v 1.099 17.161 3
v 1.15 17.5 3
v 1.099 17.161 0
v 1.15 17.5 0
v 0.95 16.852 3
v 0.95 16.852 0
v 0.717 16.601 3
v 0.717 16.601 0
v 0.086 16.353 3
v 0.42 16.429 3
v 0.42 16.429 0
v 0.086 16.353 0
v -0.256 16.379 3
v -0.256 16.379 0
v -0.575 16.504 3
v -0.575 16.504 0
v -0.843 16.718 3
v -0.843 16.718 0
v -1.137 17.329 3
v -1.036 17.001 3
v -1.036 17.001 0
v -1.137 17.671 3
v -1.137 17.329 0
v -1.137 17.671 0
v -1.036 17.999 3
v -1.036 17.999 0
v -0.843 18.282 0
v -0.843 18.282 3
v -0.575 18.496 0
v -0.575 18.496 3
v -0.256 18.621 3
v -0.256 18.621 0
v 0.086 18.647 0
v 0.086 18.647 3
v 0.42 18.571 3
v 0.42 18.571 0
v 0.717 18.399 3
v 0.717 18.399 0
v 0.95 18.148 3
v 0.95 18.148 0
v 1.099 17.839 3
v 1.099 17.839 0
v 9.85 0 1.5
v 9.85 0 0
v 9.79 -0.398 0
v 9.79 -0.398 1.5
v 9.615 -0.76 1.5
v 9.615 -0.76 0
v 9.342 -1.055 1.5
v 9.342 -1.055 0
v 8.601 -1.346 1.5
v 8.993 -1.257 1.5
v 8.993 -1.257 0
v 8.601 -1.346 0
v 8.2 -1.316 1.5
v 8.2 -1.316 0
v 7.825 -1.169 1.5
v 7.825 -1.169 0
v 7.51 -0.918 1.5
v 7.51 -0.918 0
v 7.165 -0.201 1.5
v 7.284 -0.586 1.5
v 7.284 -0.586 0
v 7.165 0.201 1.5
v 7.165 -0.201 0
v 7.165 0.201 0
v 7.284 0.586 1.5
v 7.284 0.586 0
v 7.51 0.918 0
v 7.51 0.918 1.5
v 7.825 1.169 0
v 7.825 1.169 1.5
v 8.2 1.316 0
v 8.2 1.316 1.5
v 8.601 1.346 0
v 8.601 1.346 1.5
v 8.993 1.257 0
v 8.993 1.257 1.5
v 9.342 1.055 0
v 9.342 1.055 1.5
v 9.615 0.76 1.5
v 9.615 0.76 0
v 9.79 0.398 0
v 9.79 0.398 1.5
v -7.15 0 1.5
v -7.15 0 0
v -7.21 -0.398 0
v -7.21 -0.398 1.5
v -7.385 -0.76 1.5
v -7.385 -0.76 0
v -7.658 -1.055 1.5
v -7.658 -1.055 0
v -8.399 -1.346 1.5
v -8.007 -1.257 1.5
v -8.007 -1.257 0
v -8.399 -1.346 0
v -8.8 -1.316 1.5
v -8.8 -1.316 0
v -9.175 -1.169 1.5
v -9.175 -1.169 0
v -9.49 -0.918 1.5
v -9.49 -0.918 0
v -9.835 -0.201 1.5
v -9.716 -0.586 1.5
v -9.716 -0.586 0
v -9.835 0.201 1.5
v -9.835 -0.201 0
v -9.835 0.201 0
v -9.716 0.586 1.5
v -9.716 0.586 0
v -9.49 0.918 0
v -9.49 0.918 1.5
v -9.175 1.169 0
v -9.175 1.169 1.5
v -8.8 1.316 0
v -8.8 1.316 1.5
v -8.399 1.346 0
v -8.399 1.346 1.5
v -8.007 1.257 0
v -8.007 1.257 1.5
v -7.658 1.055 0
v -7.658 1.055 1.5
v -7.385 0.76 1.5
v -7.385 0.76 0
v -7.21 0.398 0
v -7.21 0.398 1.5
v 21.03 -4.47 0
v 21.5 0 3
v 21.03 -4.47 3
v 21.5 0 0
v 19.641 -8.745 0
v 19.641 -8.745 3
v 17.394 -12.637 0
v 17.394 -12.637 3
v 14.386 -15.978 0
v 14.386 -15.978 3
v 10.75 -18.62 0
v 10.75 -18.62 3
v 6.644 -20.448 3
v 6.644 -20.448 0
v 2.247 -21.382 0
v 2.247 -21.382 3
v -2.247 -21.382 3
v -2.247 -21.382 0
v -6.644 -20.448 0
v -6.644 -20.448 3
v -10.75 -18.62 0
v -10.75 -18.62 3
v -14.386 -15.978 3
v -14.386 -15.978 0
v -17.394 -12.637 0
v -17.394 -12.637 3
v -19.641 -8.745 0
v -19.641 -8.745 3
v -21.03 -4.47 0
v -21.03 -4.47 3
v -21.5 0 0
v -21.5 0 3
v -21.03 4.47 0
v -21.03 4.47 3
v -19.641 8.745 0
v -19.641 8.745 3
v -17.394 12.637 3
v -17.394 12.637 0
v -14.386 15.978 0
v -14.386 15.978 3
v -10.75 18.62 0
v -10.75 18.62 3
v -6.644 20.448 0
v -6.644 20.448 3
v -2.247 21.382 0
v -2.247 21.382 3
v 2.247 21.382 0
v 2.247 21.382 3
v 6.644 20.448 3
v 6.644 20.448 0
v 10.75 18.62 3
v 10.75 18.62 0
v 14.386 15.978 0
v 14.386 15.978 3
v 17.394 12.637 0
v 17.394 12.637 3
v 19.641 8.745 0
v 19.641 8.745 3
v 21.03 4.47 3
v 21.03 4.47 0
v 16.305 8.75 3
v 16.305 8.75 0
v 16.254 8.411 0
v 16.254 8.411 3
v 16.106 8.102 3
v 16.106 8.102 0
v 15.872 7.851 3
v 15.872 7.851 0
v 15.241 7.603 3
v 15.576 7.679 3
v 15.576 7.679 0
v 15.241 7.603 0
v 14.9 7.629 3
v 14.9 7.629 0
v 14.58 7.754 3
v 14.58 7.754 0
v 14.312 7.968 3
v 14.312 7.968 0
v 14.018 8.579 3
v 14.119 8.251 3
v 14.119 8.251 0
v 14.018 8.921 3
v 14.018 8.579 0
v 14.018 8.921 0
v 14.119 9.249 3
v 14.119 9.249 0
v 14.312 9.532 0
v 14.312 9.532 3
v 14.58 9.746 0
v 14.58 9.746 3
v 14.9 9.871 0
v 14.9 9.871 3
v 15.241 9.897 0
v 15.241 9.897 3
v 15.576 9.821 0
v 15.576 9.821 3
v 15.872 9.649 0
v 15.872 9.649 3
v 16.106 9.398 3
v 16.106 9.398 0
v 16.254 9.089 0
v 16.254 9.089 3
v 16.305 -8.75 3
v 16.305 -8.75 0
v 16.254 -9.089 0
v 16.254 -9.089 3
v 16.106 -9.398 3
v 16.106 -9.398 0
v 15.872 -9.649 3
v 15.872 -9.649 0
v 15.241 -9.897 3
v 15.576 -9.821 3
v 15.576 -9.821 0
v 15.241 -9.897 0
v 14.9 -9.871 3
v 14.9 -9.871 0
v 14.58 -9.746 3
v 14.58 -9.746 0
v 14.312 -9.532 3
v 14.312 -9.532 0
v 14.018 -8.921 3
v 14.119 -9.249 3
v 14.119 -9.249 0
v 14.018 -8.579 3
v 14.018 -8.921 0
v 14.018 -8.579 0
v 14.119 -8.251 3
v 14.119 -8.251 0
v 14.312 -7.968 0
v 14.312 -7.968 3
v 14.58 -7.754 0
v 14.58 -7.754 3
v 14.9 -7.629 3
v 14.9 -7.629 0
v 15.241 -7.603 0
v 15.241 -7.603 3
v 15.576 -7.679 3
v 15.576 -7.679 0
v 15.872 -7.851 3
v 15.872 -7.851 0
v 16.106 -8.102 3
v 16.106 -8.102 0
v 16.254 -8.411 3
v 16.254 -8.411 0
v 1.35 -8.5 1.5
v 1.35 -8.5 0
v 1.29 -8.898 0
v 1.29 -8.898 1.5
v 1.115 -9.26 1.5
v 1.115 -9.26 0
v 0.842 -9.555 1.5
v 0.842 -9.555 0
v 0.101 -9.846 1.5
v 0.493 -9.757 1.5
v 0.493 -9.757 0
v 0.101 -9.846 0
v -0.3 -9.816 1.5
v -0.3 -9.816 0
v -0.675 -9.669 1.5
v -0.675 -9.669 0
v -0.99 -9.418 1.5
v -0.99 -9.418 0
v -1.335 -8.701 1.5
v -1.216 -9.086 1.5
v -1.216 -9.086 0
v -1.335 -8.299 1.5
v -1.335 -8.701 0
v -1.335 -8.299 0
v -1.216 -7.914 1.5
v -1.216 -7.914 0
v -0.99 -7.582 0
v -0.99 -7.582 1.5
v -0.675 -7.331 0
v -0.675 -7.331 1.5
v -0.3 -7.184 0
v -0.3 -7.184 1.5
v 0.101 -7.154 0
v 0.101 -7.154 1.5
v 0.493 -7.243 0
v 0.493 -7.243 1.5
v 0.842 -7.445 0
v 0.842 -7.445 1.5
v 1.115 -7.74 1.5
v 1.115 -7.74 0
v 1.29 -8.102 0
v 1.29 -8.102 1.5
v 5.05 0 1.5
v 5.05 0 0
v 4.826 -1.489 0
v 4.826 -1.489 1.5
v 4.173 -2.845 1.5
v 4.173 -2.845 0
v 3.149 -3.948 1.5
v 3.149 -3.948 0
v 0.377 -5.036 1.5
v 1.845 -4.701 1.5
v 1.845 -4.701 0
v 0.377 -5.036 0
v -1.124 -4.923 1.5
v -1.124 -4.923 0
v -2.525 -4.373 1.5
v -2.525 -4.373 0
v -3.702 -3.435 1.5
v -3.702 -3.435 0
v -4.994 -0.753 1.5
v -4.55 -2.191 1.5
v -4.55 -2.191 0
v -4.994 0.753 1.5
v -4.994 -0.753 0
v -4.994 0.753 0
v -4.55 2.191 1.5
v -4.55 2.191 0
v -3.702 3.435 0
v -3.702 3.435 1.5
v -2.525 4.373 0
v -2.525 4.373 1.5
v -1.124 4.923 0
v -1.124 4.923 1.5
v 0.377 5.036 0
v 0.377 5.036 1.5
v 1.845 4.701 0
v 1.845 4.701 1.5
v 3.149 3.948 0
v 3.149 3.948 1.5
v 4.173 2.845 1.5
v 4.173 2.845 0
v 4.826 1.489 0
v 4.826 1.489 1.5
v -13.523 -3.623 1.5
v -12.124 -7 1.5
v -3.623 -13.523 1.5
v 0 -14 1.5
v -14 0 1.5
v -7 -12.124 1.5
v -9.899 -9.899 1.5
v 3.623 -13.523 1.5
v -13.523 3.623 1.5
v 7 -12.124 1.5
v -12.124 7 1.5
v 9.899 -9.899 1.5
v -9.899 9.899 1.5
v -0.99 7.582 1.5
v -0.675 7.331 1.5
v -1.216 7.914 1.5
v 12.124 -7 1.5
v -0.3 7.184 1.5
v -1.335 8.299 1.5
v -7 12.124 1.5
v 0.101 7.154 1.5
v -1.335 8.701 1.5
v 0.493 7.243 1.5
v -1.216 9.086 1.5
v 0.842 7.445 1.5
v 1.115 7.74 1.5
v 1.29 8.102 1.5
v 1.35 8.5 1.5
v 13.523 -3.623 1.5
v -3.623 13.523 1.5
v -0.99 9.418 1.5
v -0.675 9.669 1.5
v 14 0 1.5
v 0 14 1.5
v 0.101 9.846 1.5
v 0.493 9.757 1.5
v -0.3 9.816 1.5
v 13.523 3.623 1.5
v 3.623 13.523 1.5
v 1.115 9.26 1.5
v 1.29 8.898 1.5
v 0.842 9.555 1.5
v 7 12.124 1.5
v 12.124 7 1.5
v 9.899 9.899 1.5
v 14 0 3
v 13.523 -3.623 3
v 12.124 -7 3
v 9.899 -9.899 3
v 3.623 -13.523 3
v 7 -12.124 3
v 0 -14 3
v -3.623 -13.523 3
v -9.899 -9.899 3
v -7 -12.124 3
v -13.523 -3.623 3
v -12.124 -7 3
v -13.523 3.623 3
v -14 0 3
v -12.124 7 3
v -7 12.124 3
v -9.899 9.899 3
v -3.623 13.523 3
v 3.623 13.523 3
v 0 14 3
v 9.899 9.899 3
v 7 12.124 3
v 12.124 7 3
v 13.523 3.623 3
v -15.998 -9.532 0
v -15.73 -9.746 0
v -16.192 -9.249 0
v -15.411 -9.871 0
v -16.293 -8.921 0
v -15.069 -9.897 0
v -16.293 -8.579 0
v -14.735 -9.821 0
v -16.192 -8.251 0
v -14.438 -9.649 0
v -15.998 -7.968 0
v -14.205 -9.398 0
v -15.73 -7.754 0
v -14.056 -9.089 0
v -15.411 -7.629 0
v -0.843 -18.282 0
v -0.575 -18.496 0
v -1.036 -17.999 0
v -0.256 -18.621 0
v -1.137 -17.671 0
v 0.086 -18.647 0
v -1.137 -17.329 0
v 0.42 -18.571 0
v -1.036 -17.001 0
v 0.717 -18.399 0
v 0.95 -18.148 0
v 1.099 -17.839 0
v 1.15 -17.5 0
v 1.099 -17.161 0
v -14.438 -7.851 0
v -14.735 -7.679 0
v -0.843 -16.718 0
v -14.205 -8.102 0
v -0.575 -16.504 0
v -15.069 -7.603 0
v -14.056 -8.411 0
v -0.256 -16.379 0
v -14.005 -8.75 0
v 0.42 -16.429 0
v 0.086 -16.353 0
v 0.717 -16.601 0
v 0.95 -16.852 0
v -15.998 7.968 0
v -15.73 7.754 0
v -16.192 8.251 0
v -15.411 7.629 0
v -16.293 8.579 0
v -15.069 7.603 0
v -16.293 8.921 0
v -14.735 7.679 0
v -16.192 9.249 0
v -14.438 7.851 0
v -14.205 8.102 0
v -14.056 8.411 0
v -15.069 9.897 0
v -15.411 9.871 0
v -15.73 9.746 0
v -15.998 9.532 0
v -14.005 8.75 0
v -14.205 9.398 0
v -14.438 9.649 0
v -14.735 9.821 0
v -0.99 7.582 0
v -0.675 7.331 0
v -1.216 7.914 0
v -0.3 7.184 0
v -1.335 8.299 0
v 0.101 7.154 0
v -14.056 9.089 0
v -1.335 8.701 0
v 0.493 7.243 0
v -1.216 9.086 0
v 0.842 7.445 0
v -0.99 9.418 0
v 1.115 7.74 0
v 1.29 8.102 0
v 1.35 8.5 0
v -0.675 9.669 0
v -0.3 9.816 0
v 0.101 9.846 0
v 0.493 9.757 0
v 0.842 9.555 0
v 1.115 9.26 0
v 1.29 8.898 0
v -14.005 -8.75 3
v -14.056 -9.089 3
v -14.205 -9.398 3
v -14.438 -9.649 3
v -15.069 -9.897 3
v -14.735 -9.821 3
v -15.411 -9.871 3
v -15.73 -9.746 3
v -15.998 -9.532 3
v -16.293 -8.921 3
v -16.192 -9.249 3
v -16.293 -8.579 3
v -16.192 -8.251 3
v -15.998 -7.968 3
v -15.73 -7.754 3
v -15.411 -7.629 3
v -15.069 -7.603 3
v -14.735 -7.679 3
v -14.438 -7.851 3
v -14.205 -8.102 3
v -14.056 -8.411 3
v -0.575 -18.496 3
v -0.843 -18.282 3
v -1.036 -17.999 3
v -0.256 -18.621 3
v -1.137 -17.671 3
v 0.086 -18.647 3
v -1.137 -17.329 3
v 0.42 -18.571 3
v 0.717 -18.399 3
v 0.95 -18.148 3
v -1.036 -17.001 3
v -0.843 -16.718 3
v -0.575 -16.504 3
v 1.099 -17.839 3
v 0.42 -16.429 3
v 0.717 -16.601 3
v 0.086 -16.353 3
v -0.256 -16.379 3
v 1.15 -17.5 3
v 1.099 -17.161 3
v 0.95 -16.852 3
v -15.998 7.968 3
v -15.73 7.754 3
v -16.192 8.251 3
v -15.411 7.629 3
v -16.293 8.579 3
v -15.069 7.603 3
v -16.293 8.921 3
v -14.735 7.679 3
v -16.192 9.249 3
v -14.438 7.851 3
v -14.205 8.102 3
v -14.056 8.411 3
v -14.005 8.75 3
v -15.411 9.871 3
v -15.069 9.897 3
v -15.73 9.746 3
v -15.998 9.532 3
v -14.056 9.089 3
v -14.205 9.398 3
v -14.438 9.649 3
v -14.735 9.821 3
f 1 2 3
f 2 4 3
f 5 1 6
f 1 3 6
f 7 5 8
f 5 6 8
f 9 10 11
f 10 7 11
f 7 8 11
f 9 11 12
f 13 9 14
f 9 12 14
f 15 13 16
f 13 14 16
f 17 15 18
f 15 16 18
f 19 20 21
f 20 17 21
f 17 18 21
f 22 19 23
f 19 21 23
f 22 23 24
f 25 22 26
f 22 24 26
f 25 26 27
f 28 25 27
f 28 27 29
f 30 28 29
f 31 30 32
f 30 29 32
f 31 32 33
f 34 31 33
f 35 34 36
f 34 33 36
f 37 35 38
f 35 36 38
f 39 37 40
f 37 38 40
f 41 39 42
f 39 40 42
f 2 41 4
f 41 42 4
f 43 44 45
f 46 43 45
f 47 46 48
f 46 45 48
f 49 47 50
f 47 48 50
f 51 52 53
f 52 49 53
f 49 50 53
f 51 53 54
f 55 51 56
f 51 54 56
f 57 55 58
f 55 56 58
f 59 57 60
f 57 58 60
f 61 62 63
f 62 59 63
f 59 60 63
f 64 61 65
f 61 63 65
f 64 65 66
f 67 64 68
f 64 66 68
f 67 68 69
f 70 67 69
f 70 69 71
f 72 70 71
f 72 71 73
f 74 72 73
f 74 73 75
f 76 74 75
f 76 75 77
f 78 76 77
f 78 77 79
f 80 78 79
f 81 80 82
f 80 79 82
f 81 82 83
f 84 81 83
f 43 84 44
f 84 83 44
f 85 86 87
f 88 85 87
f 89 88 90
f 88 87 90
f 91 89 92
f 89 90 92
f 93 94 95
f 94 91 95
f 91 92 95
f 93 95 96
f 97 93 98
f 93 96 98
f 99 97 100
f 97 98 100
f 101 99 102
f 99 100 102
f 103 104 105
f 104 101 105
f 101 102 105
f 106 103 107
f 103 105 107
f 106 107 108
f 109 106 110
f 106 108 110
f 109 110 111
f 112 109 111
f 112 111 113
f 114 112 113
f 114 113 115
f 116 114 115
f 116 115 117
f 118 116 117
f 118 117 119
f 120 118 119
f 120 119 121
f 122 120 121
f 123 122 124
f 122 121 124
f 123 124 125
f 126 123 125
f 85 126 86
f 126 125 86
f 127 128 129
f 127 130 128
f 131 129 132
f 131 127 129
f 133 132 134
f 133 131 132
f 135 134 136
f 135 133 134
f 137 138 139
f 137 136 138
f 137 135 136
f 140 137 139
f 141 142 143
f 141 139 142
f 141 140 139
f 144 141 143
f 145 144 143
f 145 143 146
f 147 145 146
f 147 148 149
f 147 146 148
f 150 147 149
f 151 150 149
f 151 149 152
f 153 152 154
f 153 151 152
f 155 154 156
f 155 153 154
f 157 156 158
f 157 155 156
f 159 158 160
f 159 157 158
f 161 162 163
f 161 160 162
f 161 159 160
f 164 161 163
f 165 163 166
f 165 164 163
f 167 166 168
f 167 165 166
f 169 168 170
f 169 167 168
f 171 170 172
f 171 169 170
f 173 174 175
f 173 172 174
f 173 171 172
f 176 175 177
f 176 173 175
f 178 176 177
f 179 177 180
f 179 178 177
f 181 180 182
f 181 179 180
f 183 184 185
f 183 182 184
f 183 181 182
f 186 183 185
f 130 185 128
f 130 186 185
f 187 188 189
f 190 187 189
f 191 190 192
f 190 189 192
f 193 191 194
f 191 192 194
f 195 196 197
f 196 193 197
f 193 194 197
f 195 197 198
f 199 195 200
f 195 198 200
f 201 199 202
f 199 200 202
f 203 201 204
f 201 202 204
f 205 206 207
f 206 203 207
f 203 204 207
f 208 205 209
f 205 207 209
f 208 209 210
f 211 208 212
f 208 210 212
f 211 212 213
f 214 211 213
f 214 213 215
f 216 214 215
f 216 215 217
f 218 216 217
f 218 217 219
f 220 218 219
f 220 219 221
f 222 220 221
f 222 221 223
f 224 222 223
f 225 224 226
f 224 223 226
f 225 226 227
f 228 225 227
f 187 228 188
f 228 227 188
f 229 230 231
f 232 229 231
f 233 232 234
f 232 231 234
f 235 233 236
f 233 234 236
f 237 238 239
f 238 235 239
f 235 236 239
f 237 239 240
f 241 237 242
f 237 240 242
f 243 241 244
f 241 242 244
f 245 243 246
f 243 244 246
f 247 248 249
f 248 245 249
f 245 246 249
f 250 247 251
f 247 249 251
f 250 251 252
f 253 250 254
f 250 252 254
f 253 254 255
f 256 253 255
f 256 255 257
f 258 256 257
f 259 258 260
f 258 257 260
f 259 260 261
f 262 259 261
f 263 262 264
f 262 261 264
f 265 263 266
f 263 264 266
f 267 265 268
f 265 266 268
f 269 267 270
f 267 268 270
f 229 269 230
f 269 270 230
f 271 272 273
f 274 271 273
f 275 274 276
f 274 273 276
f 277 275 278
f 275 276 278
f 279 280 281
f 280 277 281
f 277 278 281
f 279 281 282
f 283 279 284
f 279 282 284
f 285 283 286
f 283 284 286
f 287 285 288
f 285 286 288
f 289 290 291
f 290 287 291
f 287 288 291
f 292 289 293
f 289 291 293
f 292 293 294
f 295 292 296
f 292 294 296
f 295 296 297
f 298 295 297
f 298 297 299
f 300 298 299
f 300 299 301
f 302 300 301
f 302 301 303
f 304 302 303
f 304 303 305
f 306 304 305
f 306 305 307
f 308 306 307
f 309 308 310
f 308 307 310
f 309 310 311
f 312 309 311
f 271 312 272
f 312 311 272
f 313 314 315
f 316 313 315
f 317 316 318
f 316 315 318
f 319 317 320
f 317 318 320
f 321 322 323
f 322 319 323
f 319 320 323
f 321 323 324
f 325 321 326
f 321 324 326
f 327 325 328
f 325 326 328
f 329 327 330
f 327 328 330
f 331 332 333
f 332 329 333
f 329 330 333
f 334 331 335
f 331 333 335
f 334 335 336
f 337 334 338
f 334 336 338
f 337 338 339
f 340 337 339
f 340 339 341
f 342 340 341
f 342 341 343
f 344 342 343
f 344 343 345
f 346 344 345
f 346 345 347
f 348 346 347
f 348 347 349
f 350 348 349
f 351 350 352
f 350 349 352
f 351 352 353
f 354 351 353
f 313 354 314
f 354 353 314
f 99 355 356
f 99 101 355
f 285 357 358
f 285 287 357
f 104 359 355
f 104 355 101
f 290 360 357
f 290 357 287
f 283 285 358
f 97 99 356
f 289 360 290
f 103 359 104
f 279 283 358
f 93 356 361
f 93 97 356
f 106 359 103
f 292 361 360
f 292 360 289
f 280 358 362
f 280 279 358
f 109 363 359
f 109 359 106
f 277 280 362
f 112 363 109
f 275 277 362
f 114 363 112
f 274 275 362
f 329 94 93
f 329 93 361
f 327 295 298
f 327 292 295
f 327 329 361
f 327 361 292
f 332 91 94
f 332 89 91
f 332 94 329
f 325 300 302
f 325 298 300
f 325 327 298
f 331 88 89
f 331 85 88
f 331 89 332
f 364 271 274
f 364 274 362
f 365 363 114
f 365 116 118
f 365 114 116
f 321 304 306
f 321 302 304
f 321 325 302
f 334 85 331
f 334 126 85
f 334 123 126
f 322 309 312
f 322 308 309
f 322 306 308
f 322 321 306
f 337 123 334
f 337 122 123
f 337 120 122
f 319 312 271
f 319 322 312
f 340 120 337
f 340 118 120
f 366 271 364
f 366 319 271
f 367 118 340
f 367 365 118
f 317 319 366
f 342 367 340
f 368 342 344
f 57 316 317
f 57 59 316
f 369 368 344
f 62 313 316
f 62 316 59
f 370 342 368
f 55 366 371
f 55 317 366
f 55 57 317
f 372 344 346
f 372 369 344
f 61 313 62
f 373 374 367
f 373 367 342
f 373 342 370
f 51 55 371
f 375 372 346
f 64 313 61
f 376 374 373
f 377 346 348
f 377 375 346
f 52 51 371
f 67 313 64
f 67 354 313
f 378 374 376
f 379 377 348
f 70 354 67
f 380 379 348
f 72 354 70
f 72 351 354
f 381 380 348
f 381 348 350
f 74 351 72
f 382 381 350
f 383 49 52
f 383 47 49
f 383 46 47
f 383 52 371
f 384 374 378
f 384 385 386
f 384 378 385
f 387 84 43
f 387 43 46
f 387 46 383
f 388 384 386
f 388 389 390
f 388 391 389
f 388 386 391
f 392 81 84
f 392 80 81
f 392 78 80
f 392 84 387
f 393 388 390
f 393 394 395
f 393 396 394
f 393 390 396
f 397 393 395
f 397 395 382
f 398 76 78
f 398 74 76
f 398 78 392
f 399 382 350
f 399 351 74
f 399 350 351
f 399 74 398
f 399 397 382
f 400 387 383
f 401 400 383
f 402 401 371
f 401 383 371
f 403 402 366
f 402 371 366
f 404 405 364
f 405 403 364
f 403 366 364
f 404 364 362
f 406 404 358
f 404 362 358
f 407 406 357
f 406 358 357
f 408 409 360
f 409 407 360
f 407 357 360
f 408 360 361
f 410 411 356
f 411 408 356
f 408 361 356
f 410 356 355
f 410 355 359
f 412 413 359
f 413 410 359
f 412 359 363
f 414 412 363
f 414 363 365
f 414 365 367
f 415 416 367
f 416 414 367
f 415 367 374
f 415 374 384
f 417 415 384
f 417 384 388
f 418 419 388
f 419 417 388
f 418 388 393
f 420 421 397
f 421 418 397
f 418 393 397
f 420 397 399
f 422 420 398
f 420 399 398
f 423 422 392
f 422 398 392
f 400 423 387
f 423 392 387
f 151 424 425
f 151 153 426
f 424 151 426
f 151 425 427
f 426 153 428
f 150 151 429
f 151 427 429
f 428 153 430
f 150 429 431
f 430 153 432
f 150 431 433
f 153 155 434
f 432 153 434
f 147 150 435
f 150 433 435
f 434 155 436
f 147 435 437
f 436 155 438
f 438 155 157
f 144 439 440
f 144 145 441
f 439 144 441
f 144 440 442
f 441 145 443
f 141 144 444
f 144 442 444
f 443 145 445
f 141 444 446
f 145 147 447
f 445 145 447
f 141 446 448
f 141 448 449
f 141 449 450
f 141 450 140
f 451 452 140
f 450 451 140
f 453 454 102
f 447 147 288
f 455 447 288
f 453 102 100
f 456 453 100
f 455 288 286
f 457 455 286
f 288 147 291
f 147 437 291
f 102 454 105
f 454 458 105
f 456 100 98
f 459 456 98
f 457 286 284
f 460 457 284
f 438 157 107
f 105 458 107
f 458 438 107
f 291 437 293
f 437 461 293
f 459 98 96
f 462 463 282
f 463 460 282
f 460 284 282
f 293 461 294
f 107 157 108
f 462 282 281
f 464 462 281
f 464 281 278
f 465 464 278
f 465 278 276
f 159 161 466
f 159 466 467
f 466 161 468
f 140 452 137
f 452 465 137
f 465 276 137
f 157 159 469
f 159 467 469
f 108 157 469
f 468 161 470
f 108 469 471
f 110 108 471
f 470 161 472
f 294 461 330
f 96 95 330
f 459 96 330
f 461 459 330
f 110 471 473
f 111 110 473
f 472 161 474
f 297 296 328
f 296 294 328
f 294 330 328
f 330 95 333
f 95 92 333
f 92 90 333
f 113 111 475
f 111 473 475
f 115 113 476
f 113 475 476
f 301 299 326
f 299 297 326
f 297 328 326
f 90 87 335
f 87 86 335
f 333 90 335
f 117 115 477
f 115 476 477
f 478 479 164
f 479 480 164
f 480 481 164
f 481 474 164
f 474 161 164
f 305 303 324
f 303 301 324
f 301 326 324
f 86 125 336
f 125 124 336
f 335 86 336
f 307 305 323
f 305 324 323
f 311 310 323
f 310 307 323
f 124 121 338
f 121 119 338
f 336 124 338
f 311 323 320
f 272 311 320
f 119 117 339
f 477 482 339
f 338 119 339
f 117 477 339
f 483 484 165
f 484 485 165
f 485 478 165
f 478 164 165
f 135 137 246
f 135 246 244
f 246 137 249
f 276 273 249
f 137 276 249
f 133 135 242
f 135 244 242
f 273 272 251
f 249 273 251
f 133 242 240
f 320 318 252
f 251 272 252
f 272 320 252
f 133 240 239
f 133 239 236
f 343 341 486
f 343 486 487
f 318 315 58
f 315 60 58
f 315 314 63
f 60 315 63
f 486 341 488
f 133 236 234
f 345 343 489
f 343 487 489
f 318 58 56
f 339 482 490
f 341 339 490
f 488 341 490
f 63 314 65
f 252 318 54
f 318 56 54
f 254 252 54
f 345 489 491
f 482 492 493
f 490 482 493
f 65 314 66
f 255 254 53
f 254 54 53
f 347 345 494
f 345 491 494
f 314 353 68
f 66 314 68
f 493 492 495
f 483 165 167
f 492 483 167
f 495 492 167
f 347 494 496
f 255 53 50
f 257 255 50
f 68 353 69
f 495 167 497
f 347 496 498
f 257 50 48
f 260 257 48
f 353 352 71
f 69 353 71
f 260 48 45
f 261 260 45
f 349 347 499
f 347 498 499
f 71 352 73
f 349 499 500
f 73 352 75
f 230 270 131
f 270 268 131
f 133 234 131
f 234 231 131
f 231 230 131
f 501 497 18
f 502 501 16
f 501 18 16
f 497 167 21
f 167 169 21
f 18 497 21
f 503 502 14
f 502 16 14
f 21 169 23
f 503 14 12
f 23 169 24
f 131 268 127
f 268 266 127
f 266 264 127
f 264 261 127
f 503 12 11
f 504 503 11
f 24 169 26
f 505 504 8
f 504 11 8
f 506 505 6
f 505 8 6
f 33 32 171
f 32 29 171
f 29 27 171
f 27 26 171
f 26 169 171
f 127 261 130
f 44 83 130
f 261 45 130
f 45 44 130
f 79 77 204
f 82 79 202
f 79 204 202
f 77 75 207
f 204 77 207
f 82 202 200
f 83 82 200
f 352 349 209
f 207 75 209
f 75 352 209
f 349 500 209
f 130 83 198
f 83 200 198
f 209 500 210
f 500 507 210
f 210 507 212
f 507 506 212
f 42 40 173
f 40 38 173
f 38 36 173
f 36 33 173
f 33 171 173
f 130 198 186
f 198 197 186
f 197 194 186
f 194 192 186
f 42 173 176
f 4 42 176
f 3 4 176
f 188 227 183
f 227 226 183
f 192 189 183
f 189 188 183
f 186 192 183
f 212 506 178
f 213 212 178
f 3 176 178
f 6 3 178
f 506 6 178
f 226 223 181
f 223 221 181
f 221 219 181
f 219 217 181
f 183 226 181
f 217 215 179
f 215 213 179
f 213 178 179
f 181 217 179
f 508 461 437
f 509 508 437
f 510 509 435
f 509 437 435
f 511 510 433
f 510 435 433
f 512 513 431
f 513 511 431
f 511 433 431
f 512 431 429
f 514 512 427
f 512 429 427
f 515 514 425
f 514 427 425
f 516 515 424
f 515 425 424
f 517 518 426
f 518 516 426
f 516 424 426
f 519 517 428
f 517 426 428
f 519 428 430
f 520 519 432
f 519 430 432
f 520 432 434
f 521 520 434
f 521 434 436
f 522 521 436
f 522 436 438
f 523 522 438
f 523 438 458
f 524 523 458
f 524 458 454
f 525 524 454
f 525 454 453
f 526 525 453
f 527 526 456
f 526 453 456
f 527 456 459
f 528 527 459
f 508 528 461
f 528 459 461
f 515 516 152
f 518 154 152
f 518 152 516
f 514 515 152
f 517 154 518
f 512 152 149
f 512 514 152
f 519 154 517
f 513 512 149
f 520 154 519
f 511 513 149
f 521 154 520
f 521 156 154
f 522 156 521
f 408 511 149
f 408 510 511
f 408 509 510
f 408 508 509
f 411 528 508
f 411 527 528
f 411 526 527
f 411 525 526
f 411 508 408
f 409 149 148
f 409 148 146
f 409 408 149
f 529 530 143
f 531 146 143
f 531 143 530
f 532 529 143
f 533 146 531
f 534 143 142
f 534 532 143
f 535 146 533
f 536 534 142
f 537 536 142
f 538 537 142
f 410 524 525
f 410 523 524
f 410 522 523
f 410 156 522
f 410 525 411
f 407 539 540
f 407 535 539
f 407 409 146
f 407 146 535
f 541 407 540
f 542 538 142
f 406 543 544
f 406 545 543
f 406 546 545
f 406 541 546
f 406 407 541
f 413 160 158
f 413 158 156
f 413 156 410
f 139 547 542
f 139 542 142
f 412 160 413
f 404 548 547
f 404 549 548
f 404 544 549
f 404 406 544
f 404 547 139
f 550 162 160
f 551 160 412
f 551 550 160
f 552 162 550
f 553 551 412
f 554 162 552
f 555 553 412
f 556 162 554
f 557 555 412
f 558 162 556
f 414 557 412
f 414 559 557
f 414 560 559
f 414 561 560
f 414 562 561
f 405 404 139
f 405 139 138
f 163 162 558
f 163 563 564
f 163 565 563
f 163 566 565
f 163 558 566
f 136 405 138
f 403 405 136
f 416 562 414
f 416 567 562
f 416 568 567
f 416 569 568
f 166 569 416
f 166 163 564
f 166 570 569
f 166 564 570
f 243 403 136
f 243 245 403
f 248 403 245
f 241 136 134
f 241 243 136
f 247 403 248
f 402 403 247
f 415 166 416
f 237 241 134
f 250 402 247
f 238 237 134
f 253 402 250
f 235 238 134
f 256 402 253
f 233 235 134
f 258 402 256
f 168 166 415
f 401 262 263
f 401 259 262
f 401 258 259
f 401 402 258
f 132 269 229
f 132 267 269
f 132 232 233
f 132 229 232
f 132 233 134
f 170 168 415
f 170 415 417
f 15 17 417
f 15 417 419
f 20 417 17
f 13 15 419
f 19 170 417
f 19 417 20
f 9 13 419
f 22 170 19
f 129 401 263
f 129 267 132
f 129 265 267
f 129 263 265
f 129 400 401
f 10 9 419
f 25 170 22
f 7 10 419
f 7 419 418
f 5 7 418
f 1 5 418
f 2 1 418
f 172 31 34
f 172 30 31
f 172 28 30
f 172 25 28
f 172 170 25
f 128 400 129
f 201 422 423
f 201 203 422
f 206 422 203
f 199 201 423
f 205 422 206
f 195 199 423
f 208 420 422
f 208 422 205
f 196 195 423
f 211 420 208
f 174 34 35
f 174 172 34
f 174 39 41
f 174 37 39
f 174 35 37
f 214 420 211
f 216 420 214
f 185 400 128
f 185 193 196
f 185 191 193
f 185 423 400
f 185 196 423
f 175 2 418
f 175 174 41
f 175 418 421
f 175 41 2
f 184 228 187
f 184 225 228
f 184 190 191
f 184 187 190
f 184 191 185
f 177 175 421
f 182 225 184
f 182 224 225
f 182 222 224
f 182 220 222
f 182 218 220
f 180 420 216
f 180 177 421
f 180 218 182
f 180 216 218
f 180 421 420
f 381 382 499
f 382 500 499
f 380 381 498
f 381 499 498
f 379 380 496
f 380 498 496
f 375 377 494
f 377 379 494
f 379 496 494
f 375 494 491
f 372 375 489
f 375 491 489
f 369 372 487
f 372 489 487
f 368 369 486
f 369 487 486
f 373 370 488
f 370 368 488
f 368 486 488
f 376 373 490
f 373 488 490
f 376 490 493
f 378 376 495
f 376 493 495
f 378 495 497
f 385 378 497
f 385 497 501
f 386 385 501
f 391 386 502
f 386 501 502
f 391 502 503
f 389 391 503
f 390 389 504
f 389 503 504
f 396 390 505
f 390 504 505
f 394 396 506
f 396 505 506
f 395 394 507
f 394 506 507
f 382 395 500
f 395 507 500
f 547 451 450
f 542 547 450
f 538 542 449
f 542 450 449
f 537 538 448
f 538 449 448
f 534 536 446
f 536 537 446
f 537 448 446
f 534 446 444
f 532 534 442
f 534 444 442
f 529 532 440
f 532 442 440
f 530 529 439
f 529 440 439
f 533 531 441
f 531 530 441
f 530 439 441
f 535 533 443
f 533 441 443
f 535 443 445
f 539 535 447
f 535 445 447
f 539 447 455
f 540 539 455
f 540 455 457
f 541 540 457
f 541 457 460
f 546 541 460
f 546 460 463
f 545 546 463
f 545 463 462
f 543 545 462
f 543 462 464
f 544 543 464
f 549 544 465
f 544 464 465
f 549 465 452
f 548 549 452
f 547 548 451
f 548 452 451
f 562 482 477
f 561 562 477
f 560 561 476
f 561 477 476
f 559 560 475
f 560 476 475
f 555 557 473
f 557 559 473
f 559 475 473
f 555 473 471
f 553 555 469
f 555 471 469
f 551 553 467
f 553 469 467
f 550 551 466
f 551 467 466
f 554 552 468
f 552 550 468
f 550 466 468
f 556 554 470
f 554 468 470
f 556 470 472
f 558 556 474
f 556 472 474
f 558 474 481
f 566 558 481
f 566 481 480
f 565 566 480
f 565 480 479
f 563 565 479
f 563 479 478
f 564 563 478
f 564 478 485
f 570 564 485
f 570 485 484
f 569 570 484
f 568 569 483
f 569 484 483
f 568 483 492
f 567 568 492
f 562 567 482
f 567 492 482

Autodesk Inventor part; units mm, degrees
ref_plane "YZ Plane" through (0, 0, 0) normal (1, 0, 0) x (0, 1, 0)
ref_plane "XZ Plane" through (0, 0, 0) normal (0, 1, 0) x (-1, 0, 0)
ref_plane "XY Plane" through (0, 0, 0) normal (0, 0, 1) x (1, 0, 0)
sketch "スケッチ1" plane through (0, 0, 0) normal (0, 0, 1) x (1, 0, 0)
  circle A0 centre (0, 0) radius 21.5
  circle A1 centre (0, 0) radius 14
  line L0 (0, 21.5) -> (0, -21.5) construction
  circle A2 centre (0, 17.5) radius 1.15
  circle A3 centre (-15.1554, 8.75) radius 1.15
  circle A4 centre (-15.1554, -8.75) radius 1.15
  circle A5 centre (0, -17.5) radius 1.15
  circle A6 centre (15.1554, -8.75) radius 1.15
  circle A7 centre (15.1554, 8.75) radius 1.15
  circle A8 centre (0, 8.5) radius 1.35
  circle A9 centre (-8.5, 0) radius 1.35
  circle A10 centre (0, -8.5) radius 1.35
  circle A11 centre (8.5, 0) radius 1.35
  circle A12 centre (0, 0) radius 5.05
  dimension "d0" = 43
  dimension "d1" = 28
  dimension "d2" = 2.3
  dimension "d3" = 17.5
  dimension "d6" = 360
  dimension "d8" = 2.7
  dimension "d9" = 8.5
  dimension "d12" = 360
  dimension "d16" = 10.1
extrude "押し出し1" add sketch "スケッチ1" along normal blind 3 contours A0
extrude "押し出し2" add sketch "スケッチ1" along normal blind 1.5 contours A1
properties part number "Leg_joint_cross_bearing_frame" material "アルミニウム 2014-T4"
